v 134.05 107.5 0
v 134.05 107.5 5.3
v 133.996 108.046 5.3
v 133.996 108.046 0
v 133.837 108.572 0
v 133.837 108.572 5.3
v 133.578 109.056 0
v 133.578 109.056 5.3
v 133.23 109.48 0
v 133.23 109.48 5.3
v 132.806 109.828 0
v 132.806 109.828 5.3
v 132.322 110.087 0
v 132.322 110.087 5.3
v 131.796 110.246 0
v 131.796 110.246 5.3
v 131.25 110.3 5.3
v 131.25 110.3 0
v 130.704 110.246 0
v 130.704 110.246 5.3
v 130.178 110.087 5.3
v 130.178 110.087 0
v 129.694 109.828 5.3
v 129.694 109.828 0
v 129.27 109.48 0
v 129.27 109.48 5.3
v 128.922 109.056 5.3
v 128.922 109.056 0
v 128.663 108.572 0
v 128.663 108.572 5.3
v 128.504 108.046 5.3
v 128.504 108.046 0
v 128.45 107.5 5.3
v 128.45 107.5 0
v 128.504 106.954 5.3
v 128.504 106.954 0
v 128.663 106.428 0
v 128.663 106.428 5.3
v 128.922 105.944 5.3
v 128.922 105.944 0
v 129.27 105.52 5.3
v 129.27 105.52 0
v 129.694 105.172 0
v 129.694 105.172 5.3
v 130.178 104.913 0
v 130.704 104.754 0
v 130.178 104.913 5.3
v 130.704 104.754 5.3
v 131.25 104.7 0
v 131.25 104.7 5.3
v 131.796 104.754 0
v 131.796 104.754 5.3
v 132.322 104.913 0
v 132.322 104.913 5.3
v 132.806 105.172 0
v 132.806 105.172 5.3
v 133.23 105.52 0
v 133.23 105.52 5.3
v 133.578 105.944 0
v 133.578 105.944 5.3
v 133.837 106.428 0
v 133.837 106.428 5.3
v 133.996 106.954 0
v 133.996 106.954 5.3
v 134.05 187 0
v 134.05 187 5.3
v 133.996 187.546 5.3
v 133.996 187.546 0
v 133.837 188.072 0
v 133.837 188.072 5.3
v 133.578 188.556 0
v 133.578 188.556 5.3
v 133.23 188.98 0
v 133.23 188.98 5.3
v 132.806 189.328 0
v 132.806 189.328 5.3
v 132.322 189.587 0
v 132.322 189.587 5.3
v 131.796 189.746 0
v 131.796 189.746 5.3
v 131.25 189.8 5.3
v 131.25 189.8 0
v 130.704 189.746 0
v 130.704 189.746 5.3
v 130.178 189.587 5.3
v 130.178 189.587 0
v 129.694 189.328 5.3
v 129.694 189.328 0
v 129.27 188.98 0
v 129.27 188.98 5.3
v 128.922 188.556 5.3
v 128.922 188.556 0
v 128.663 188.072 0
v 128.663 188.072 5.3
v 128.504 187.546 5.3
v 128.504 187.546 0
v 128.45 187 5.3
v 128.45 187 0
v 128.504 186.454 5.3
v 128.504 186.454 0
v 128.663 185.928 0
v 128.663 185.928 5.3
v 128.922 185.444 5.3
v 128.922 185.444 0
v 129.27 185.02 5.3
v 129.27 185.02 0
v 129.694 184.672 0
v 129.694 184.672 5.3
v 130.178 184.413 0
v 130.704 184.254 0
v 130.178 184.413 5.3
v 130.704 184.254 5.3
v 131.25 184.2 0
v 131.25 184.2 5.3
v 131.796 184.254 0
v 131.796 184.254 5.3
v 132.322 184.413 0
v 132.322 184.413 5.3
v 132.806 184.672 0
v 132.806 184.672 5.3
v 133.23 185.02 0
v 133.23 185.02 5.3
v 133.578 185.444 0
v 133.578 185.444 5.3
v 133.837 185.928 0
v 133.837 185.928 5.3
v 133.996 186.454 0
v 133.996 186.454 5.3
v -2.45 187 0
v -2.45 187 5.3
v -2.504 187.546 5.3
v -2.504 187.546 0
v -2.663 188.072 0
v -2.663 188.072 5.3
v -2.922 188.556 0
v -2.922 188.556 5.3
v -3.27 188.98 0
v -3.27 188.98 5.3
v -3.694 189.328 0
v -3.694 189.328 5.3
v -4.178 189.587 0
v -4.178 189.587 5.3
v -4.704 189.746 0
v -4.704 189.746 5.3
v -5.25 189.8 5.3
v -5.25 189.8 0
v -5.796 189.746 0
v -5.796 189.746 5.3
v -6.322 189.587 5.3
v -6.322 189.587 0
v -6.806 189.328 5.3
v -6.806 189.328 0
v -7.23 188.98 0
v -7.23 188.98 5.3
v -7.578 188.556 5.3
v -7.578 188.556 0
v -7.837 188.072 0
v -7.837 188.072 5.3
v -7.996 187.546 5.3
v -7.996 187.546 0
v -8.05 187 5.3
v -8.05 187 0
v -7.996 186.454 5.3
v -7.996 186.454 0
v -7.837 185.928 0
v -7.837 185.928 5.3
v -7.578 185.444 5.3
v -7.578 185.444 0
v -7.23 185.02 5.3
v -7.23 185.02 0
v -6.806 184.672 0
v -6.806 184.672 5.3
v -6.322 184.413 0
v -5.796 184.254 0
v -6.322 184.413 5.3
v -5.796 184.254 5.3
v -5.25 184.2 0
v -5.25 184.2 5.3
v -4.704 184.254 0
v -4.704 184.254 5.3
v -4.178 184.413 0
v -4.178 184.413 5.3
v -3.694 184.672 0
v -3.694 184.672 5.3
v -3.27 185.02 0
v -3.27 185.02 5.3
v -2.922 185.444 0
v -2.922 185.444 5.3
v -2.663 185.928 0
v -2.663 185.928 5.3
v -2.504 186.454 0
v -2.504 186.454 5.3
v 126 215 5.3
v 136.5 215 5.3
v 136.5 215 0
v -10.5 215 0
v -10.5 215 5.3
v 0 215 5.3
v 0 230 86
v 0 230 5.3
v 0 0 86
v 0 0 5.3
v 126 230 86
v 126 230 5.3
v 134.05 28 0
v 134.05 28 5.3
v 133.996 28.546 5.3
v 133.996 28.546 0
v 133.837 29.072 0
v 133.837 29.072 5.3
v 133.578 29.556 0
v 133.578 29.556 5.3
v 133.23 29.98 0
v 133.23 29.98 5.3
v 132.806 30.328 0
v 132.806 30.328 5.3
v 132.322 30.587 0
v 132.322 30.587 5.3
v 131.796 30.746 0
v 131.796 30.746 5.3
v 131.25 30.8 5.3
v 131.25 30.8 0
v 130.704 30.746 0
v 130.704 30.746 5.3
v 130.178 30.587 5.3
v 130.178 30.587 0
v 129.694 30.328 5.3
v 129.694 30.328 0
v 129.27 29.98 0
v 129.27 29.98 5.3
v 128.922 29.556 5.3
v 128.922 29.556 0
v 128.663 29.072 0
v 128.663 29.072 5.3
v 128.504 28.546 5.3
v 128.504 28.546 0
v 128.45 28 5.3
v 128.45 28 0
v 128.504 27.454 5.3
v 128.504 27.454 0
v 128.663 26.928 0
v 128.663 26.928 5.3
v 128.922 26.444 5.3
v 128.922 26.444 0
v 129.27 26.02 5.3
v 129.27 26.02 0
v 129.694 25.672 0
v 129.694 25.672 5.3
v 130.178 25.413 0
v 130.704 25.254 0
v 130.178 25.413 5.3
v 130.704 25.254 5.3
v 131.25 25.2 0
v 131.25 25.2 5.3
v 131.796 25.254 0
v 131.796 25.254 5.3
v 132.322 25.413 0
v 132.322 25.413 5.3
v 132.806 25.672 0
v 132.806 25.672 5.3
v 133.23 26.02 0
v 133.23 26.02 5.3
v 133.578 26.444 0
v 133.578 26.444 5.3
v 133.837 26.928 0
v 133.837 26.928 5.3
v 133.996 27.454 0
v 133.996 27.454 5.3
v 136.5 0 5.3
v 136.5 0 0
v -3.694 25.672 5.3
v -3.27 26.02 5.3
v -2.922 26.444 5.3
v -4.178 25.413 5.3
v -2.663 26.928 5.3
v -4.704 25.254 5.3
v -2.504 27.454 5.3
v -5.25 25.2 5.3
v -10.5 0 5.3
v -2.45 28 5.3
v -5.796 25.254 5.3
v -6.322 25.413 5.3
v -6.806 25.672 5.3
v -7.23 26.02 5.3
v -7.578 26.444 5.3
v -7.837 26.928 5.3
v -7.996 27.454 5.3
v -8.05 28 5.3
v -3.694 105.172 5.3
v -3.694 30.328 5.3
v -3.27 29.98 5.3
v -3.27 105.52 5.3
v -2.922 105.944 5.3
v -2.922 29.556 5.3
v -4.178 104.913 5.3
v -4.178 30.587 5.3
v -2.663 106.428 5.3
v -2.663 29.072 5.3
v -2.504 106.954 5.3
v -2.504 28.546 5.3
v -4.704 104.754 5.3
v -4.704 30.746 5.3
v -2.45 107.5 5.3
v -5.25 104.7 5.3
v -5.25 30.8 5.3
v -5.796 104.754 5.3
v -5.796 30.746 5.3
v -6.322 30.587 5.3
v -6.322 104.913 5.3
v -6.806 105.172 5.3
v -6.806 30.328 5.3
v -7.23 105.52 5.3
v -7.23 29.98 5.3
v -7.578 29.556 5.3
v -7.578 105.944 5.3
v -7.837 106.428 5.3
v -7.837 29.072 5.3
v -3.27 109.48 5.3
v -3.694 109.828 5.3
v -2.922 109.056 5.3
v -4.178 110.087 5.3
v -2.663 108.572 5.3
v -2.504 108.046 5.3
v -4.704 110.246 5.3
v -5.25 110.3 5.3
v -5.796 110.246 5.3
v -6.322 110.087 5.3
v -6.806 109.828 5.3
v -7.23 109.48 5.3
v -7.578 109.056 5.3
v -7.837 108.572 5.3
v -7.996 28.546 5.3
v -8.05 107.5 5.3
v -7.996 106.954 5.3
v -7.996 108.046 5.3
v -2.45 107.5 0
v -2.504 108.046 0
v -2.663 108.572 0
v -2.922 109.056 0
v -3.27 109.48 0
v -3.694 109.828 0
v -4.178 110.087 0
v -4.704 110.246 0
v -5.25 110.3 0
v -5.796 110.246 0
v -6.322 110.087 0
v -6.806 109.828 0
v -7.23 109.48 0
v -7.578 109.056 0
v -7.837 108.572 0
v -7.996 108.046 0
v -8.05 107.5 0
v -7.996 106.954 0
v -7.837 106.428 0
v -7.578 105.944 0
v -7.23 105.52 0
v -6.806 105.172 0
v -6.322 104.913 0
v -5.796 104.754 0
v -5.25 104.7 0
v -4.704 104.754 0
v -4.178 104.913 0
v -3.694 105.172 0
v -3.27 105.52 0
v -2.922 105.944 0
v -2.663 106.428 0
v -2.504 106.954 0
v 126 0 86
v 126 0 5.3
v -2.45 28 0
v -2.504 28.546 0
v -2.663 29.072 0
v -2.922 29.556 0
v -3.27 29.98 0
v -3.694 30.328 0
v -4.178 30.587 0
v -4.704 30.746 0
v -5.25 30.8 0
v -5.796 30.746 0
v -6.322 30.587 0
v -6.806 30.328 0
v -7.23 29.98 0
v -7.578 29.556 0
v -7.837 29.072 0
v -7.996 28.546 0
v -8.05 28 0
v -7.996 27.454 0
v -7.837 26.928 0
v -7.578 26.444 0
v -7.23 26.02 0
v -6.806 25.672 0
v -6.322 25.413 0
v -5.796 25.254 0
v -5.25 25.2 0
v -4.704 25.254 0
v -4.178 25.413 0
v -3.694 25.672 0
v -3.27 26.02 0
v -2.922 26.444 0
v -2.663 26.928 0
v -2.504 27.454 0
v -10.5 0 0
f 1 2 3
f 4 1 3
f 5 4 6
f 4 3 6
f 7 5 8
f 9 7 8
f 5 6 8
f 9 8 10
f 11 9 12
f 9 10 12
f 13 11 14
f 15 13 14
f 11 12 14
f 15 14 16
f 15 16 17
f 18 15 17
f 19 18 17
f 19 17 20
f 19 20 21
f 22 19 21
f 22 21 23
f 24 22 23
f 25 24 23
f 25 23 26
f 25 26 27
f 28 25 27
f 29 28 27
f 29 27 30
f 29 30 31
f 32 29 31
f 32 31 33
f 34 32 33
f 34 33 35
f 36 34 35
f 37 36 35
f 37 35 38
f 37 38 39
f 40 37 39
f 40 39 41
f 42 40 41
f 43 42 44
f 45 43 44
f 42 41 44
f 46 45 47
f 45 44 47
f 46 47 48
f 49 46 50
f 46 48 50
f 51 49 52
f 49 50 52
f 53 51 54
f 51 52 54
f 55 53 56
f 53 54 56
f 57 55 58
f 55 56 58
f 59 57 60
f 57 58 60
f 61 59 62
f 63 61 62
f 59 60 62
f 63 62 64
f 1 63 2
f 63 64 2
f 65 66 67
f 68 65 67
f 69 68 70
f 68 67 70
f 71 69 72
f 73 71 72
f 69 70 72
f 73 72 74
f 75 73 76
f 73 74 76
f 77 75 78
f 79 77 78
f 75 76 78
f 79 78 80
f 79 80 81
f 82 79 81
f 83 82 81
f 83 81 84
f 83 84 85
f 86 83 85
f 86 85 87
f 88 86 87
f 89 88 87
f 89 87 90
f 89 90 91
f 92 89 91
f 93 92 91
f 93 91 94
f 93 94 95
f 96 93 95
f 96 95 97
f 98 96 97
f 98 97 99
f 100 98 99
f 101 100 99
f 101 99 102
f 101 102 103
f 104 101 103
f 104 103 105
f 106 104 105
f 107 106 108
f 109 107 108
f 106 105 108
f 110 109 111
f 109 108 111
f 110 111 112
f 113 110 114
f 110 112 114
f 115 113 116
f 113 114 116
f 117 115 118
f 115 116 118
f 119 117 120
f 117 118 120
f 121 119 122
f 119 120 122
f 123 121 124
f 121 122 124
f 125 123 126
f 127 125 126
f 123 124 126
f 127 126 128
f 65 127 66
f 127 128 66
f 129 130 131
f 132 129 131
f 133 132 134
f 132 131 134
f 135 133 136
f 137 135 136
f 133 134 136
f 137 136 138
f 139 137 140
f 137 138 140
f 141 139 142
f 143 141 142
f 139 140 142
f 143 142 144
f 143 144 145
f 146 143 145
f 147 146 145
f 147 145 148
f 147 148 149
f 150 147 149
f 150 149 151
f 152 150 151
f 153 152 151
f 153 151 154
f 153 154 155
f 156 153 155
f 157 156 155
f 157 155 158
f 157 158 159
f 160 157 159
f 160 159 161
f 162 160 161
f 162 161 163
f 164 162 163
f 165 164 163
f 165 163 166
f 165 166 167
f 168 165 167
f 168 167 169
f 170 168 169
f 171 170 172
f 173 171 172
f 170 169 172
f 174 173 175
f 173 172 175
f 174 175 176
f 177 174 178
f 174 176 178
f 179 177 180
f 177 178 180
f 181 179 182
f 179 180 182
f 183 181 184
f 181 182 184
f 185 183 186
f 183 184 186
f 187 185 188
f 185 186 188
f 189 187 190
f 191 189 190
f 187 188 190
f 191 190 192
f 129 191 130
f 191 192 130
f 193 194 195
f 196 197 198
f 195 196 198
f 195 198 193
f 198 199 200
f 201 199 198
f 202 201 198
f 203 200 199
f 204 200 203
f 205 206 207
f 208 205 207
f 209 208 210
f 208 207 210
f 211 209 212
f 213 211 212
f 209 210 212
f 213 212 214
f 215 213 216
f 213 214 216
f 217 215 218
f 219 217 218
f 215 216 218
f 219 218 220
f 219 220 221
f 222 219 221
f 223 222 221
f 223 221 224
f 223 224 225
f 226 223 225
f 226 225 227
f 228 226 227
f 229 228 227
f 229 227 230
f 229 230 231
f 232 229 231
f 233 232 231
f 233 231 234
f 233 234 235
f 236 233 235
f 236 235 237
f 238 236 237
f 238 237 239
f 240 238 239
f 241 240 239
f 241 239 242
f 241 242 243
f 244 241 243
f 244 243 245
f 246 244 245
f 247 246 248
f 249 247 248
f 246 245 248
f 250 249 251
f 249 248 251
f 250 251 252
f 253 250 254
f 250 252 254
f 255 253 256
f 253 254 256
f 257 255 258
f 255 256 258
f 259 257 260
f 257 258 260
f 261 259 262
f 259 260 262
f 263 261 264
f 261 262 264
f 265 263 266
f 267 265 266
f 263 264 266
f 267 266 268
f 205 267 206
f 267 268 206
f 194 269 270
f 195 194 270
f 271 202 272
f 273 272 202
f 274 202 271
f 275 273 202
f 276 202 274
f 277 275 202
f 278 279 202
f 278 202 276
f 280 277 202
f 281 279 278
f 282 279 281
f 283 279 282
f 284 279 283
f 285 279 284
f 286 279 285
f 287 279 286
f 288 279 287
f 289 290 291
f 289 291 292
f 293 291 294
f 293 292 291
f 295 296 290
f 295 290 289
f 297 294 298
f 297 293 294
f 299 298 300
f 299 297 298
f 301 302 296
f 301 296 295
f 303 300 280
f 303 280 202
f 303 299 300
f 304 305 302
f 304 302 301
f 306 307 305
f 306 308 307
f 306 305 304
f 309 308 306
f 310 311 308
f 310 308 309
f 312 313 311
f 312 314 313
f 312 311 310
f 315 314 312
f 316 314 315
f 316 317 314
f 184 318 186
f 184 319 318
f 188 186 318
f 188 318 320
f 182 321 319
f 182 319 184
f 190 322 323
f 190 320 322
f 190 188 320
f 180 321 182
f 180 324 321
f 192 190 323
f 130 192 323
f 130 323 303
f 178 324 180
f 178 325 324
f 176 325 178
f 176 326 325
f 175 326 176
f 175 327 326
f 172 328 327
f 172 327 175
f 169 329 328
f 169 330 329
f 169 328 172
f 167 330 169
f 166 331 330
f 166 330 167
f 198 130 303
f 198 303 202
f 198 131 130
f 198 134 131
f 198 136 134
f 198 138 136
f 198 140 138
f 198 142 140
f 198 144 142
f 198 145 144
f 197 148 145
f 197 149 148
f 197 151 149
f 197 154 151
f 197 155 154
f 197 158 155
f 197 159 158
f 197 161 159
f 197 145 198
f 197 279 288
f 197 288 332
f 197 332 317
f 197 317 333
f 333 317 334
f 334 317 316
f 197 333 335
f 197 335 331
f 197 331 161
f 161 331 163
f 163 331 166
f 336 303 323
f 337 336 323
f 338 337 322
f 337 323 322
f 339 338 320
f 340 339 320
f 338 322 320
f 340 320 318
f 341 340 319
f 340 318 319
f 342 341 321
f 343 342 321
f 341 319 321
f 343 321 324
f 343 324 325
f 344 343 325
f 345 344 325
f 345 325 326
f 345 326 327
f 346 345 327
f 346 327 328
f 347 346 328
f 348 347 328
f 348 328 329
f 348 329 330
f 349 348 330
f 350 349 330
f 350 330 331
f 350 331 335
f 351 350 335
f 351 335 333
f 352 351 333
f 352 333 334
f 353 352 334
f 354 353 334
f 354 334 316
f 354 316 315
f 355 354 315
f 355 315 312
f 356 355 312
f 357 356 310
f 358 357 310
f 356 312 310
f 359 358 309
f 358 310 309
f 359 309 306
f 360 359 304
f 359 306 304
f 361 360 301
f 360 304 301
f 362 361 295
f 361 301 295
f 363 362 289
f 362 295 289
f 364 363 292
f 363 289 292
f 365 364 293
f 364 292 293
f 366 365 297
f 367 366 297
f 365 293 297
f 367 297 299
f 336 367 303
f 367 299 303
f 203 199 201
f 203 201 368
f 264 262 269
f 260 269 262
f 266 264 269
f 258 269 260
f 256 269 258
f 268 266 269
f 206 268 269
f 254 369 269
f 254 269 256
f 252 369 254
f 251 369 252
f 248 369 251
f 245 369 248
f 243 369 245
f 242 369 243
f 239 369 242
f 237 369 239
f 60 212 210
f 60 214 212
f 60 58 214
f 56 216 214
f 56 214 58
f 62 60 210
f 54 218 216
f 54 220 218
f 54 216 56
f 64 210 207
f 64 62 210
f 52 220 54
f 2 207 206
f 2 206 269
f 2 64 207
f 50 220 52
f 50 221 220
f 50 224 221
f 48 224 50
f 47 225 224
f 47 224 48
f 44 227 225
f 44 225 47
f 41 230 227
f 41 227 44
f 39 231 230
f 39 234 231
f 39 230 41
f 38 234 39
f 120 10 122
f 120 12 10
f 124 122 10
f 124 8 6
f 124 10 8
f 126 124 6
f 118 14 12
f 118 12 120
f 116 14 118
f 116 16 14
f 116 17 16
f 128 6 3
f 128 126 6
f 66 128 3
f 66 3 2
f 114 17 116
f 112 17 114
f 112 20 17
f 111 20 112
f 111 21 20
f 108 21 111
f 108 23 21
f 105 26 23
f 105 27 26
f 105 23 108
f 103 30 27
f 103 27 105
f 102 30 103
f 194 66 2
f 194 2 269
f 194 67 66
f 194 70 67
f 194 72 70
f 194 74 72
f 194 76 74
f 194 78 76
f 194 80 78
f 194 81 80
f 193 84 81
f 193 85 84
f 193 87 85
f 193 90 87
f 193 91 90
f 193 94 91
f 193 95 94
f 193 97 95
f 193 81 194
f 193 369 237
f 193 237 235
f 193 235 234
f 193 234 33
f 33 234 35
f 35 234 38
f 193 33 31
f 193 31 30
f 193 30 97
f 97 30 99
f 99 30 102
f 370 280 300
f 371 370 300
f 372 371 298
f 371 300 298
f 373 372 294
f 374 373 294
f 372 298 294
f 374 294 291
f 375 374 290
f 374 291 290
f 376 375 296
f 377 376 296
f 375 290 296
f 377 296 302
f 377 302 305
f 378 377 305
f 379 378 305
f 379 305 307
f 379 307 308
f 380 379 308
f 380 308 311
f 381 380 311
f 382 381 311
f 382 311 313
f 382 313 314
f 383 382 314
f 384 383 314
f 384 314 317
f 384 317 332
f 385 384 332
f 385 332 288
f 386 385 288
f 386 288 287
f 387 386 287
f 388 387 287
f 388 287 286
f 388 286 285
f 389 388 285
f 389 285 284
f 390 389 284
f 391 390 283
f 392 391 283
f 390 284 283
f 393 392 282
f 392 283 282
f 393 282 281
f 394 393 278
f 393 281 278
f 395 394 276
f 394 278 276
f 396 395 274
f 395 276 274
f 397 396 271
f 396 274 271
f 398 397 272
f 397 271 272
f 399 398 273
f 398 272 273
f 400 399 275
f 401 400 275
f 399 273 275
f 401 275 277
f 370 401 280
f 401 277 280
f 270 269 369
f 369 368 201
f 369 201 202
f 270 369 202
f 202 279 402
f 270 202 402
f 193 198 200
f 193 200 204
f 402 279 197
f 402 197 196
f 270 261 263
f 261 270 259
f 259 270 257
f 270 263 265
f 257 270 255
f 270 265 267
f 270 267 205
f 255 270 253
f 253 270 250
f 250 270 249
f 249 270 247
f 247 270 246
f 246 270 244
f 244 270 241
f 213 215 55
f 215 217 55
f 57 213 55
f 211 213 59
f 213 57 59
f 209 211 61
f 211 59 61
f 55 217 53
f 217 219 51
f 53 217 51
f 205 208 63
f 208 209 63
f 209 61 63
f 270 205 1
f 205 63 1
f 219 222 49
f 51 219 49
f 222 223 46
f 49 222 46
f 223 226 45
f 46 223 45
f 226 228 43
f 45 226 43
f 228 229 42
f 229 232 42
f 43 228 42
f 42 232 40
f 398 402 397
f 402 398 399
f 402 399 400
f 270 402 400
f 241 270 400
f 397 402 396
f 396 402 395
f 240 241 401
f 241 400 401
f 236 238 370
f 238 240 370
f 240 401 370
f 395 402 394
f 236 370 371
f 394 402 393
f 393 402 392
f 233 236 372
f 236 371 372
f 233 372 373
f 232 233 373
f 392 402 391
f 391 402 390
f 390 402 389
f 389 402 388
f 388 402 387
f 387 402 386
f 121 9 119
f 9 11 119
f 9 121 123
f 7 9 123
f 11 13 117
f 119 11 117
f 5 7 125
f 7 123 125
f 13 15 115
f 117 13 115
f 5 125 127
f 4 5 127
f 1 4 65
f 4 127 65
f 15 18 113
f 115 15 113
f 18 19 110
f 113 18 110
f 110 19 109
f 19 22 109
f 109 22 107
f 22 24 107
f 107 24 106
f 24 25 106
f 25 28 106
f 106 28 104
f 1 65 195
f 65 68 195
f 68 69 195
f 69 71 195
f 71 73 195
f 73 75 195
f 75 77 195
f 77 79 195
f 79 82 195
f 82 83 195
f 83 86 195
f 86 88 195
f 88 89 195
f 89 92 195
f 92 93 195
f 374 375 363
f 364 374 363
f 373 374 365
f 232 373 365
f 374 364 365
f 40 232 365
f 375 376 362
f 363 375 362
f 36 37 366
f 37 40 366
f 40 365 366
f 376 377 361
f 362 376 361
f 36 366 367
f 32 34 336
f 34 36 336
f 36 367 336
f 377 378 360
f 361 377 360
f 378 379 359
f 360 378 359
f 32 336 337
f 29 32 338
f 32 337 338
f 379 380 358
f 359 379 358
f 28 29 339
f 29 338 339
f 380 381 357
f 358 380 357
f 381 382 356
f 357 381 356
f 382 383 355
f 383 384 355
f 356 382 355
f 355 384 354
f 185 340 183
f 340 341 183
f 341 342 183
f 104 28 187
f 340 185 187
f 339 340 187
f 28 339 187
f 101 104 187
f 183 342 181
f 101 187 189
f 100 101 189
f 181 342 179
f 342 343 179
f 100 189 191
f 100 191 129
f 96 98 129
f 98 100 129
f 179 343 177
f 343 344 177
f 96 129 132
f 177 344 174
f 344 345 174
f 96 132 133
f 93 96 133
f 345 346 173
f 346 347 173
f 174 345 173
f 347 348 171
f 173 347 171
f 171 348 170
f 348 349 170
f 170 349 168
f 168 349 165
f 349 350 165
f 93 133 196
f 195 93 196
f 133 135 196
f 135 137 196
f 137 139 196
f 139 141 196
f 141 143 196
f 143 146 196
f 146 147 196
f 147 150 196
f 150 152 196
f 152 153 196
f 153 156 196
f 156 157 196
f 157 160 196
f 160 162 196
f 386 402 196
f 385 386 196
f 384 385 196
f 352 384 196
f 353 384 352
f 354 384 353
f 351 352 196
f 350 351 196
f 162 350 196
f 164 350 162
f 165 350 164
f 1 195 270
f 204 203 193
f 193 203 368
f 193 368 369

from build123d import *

# Parameters (mm, degrees)
SKETCH2_W                = 126
SKETCH2_H                = 215
BOSS_EXTRUDE1_DEPTH      = 86
BOSS_EXTRUDE2_DEPTH      = 10.5
BOSS_EXTRUDE2_DEPTH_BACK = 136.5
SKETCH3_W                = 5.3
SKETCH3_H                = 215
SKETCH5_R                = 2.8
CUT_EXTRUDE1_DEPTH       = 10.5
SKETCH6_R                = 2.8
CUT_EXTRUDE2_DEPTH       = 10.5
SKETCH7_R                = 2.8
CUT_EXTRUDE3_DEPTH       = 10.5
LPATTERN1_COUNT          = 2
LPATTERN1_PITCH          = 136.5
SKETCH8_W                = 126
SKETCH8_H                = 80.7
BOSS_EXTRUDE3_DEPTH      = 15


with BuildPart() as part:
    # Sketch2 → Boss-Extrude1 (new body)
    with BuildSketch(Plane.XY):
        with Locations((63, 107.5)):
            Rectangle(SKETCH2_W, SKETCH2_H)
    extrude(amount=BOSS_EXTRUDE1_DEPTH)

    # Sketch3 → Boss-Extrude2 (add, two sides: drawn at the far end of the back side and taken through both)
    with BuildSketch(Plane(origin=(126, 0, 0), x_dir=(0, 0, -1), z_dir=(1, 0, 0)).offset(-BOSS_EXTRUDE2_DEPTH_BACK)):
        with Locations((-2.65, 107.5)):
            Rectangle(SKETCH3_W, SKETCH3_H)
    extrude(amount=BOSS_EXTRUDE2_DEPTH + BOSS_EXTRUDE2_DEPTH_BACK)

    # Sketch5 → Cut-Extrude1 (cut)
    with BuildSketch(Plane.XY.offset(5.3)):
        with Locations((131.25, 28)):
            Circle(SKETCH5_R)
    cut_extrude1 = extrude(amount=-CUT_EXTRUDE1_DEPTH, mode=Mode.SUBTRACT)

    # Sketch6 → Cut-Extrude2 (cut)
    with BuildSketch(Plane.XY.offset(5.3)):
        with Locations((131.25, 107.5)):
            Circle(SKETCH6_R)
    cut_extrude2 = extrude(amount=-CUT_EXTRUDE2_DEPTH, mode=Mode.SUBTRACT)

    # Sketch7 → Cut-Extrude3 (cut)
    with BuildSketch(Plane.XY.offset(5.3)):
        with Locations((131.25, 187)):
            Circle(SKETCH7_R)
    cut_extrude3 = extrude(amount=-CUT_EXTRUDE3_DEPTH, mode=Mode.SUBTRACT)

    # LPattern1: Cut-Extrude1, Cut-Extrude2, Cut-Extrude3 ×2
    with Locations(*[(-i * LPATTERN1_PITCH, 0, 0) for i in range(1, LPATTERN1_COUNT)]):
        add(cut_extrude1, mode=Mode.SUBTRACT)
        add(cut_extrude2, mode=Mode.SUBTRACT)
        add(cut_extrude3, mode=Mode.SUBTRACT)

    # Sketch8 → Boss-Extrude3 (add)
    with BuildSketch(Plane(origin=(0, 215, 0), x_dir=(1, 0, 0), z_dir=(0, 1, 0))):
        with Locations((63, -45.65)):
            Rectangle(SKETCH8_W, SKETCH8_H)
    extrude(amount=BOSS_EXTRUDE3_DEPTH)


solid = part.part
